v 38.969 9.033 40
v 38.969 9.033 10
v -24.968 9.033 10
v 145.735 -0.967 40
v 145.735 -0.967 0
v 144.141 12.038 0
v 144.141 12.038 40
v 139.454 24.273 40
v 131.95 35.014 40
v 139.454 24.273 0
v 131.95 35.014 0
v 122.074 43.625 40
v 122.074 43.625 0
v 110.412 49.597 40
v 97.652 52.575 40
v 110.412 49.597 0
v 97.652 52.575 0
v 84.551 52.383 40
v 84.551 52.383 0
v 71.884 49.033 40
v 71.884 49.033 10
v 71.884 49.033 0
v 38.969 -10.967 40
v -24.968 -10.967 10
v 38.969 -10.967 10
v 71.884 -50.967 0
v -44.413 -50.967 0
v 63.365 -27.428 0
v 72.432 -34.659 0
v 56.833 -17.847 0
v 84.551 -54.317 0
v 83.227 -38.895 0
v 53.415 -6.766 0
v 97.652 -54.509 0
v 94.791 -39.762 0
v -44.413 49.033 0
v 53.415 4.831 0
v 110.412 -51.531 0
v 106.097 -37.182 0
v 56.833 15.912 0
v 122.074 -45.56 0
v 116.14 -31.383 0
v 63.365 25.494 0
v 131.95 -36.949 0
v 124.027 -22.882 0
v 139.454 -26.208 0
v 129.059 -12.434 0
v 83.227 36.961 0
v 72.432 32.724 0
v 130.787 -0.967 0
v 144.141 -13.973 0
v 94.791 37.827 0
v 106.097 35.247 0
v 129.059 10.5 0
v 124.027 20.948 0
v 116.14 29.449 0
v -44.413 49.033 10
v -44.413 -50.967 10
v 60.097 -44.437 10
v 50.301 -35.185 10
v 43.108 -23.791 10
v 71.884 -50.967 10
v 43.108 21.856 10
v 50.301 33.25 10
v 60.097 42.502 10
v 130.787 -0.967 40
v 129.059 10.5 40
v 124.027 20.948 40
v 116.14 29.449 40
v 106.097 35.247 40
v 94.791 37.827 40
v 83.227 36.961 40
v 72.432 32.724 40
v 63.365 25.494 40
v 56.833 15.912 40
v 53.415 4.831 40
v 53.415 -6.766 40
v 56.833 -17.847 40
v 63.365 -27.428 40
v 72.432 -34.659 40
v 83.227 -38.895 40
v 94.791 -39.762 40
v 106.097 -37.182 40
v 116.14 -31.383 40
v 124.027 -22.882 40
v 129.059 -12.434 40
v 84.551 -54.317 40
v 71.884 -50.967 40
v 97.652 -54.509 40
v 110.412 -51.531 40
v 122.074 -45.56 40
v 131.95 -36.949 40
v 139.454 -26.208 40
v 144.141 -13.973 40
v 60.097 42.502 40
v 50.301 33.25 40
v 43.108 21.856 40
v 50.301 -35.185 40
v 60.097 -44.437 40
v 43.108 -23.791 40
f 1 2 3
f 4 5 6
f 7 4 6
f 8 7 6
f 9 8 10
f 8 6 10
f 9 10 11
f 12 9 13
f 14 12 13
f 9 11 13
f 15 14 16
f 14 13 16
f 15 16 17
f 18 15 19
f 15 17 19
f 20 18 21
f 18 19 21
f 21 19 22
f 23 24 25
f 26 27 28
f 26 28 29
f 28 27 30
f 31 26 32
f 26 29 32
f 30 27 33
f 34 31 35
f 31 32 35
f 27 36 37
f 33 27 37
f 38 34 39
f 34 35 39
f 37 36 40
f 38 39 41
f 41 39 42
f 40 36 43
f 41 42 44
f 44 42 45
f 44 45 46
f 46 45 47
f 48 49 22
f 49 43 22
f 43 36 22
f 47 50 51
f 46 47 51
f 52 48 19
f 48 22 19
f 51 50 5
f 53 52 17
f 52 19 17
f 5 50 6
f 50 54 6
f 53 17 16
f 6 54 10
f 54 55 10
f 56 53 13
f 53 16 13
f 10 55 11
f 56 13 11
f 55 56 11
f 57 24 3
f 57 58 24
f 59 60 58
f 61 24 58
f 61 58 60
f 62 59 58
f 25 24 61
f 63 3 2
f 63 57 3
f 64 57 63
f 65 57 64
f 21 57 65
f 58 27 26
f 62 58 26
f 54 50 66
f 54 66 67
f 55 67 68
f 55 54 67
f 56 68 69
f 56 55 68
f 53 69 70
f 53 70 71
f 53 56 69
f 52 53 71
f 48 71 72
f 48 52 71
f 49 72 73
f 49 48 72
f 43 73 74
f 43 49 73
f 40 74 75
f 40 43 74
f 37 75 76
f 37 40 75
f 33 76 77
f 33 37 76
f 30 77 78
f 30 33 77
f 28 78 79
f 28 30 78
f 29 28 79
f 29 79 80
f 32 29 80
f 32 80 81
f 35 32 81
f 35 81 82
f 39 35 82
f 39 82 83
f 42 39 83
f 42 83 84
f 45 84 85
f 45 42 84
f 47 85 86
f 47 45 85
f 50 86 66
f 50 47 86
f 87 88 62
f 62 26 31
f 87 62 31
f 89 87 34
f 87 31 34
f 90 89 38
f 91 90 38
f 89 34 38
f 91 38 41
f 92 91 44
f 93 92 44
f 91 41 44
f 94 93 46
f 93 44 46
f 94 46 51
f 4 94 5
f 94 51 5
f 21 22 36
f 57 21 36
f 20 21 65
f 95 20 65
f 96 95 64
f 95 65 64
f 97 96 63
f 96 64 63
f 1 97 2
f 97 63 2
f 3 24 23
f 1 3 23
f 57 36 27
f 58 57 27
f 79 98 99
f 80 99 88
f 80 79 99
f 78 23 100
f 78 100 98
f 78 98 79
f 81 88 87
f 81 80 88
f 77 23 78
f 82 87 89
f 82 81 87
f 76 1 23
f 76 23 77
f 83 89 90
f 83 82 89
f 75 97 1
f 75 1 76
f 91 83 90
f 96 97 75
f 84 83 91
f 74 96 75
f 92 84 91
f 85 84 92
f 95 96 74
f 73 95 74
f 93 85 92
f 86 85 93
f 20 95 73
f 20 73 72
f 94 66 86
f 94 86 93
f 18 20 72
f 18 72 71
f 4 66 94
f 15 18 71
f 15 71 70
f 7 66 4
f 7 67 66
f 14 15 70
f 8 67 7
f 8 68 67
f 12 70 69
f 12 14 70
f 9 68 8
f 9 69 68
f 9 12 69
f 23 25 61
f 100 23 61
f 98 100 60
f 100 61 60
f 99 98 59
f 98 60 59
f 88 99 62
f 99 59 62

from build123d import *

# Parameters (mm, degrees)
F0_R     = 38.903561
F1_DEPTH = 40
F2_DEPTH = 10
F4_DEPTH = 30
F6_DEPTH = 20


with BuildPart() as f1:
    # F0 (on Top) → F1 (new body)
    with BuildSketch(Plane.XY):
        with BuildLine():
            ThreePointArc((145.735341, -0.967313), (122.074479, 43.625472), (71.883693, 49.032687))
            ThreePointArc((71.883693, 49.032687), (38.032045, -0.967313), (71.883693, -50.967313))
            ThreePointArc((71.883693, -50.967313), (122.074479, -45.560098), (145.735341, -0.967313))
        make_face()
        with Locations((91.883693, -0.967313)):
            Circle(F0_R, mode=Mode.SUBTRACT)
    extrude(amount=F1_DEPTH)

    # F0 (on Top) → F2 (join)
    with BuildSketch(Plane.XY):
        with BuildLine():
            Line((71.883693, 49.032687), (-44.412829, 49.032687))
            Line((-44.412829, 49.032687), (-44.412829, -50.967313))
            Line((-44.412829, -50.967313), (71.883693, -50.967313))
            ThreePointArc((71.883693, -50.967313), (38.032045, -0.967313), (71.883693, 49.032687))
        make_face()
    extrude(amount=F2_DEPTH)

    # F3 (on face) → F4 (join)
    with BuildSketch(Plane.XY.offset(10)):
        with BuildLine():
            ThreePointArc((38.968667, -10.967313), (38.032045, -0.967313), (38.968667, 9.032687))
            Line((38.968667, 9.032687), (-24.967955, 9.032687))
            Line((-24.967955, 9.032687), (-24.967955, -0.967313))
            Line((-24.967955, -0.967313), (-24.967955, -10.967313))
            Line((-24.967955, -10.967313), (38.968667, -10.967313))
        make_face()
    extrude(amount=F4_DEPTH)

    # F5 (on face) → F6 (cut)
    with BuildSketch(Plane.XZ.offset(10.967313)):
        Polygon((-24.967955, 40), (-24.967955, 10), (38.968667, 40), align=None)
    extrude(amount=-F6_DEPTH, mode=Mode.SUBTRACT)


solid = f1.part
